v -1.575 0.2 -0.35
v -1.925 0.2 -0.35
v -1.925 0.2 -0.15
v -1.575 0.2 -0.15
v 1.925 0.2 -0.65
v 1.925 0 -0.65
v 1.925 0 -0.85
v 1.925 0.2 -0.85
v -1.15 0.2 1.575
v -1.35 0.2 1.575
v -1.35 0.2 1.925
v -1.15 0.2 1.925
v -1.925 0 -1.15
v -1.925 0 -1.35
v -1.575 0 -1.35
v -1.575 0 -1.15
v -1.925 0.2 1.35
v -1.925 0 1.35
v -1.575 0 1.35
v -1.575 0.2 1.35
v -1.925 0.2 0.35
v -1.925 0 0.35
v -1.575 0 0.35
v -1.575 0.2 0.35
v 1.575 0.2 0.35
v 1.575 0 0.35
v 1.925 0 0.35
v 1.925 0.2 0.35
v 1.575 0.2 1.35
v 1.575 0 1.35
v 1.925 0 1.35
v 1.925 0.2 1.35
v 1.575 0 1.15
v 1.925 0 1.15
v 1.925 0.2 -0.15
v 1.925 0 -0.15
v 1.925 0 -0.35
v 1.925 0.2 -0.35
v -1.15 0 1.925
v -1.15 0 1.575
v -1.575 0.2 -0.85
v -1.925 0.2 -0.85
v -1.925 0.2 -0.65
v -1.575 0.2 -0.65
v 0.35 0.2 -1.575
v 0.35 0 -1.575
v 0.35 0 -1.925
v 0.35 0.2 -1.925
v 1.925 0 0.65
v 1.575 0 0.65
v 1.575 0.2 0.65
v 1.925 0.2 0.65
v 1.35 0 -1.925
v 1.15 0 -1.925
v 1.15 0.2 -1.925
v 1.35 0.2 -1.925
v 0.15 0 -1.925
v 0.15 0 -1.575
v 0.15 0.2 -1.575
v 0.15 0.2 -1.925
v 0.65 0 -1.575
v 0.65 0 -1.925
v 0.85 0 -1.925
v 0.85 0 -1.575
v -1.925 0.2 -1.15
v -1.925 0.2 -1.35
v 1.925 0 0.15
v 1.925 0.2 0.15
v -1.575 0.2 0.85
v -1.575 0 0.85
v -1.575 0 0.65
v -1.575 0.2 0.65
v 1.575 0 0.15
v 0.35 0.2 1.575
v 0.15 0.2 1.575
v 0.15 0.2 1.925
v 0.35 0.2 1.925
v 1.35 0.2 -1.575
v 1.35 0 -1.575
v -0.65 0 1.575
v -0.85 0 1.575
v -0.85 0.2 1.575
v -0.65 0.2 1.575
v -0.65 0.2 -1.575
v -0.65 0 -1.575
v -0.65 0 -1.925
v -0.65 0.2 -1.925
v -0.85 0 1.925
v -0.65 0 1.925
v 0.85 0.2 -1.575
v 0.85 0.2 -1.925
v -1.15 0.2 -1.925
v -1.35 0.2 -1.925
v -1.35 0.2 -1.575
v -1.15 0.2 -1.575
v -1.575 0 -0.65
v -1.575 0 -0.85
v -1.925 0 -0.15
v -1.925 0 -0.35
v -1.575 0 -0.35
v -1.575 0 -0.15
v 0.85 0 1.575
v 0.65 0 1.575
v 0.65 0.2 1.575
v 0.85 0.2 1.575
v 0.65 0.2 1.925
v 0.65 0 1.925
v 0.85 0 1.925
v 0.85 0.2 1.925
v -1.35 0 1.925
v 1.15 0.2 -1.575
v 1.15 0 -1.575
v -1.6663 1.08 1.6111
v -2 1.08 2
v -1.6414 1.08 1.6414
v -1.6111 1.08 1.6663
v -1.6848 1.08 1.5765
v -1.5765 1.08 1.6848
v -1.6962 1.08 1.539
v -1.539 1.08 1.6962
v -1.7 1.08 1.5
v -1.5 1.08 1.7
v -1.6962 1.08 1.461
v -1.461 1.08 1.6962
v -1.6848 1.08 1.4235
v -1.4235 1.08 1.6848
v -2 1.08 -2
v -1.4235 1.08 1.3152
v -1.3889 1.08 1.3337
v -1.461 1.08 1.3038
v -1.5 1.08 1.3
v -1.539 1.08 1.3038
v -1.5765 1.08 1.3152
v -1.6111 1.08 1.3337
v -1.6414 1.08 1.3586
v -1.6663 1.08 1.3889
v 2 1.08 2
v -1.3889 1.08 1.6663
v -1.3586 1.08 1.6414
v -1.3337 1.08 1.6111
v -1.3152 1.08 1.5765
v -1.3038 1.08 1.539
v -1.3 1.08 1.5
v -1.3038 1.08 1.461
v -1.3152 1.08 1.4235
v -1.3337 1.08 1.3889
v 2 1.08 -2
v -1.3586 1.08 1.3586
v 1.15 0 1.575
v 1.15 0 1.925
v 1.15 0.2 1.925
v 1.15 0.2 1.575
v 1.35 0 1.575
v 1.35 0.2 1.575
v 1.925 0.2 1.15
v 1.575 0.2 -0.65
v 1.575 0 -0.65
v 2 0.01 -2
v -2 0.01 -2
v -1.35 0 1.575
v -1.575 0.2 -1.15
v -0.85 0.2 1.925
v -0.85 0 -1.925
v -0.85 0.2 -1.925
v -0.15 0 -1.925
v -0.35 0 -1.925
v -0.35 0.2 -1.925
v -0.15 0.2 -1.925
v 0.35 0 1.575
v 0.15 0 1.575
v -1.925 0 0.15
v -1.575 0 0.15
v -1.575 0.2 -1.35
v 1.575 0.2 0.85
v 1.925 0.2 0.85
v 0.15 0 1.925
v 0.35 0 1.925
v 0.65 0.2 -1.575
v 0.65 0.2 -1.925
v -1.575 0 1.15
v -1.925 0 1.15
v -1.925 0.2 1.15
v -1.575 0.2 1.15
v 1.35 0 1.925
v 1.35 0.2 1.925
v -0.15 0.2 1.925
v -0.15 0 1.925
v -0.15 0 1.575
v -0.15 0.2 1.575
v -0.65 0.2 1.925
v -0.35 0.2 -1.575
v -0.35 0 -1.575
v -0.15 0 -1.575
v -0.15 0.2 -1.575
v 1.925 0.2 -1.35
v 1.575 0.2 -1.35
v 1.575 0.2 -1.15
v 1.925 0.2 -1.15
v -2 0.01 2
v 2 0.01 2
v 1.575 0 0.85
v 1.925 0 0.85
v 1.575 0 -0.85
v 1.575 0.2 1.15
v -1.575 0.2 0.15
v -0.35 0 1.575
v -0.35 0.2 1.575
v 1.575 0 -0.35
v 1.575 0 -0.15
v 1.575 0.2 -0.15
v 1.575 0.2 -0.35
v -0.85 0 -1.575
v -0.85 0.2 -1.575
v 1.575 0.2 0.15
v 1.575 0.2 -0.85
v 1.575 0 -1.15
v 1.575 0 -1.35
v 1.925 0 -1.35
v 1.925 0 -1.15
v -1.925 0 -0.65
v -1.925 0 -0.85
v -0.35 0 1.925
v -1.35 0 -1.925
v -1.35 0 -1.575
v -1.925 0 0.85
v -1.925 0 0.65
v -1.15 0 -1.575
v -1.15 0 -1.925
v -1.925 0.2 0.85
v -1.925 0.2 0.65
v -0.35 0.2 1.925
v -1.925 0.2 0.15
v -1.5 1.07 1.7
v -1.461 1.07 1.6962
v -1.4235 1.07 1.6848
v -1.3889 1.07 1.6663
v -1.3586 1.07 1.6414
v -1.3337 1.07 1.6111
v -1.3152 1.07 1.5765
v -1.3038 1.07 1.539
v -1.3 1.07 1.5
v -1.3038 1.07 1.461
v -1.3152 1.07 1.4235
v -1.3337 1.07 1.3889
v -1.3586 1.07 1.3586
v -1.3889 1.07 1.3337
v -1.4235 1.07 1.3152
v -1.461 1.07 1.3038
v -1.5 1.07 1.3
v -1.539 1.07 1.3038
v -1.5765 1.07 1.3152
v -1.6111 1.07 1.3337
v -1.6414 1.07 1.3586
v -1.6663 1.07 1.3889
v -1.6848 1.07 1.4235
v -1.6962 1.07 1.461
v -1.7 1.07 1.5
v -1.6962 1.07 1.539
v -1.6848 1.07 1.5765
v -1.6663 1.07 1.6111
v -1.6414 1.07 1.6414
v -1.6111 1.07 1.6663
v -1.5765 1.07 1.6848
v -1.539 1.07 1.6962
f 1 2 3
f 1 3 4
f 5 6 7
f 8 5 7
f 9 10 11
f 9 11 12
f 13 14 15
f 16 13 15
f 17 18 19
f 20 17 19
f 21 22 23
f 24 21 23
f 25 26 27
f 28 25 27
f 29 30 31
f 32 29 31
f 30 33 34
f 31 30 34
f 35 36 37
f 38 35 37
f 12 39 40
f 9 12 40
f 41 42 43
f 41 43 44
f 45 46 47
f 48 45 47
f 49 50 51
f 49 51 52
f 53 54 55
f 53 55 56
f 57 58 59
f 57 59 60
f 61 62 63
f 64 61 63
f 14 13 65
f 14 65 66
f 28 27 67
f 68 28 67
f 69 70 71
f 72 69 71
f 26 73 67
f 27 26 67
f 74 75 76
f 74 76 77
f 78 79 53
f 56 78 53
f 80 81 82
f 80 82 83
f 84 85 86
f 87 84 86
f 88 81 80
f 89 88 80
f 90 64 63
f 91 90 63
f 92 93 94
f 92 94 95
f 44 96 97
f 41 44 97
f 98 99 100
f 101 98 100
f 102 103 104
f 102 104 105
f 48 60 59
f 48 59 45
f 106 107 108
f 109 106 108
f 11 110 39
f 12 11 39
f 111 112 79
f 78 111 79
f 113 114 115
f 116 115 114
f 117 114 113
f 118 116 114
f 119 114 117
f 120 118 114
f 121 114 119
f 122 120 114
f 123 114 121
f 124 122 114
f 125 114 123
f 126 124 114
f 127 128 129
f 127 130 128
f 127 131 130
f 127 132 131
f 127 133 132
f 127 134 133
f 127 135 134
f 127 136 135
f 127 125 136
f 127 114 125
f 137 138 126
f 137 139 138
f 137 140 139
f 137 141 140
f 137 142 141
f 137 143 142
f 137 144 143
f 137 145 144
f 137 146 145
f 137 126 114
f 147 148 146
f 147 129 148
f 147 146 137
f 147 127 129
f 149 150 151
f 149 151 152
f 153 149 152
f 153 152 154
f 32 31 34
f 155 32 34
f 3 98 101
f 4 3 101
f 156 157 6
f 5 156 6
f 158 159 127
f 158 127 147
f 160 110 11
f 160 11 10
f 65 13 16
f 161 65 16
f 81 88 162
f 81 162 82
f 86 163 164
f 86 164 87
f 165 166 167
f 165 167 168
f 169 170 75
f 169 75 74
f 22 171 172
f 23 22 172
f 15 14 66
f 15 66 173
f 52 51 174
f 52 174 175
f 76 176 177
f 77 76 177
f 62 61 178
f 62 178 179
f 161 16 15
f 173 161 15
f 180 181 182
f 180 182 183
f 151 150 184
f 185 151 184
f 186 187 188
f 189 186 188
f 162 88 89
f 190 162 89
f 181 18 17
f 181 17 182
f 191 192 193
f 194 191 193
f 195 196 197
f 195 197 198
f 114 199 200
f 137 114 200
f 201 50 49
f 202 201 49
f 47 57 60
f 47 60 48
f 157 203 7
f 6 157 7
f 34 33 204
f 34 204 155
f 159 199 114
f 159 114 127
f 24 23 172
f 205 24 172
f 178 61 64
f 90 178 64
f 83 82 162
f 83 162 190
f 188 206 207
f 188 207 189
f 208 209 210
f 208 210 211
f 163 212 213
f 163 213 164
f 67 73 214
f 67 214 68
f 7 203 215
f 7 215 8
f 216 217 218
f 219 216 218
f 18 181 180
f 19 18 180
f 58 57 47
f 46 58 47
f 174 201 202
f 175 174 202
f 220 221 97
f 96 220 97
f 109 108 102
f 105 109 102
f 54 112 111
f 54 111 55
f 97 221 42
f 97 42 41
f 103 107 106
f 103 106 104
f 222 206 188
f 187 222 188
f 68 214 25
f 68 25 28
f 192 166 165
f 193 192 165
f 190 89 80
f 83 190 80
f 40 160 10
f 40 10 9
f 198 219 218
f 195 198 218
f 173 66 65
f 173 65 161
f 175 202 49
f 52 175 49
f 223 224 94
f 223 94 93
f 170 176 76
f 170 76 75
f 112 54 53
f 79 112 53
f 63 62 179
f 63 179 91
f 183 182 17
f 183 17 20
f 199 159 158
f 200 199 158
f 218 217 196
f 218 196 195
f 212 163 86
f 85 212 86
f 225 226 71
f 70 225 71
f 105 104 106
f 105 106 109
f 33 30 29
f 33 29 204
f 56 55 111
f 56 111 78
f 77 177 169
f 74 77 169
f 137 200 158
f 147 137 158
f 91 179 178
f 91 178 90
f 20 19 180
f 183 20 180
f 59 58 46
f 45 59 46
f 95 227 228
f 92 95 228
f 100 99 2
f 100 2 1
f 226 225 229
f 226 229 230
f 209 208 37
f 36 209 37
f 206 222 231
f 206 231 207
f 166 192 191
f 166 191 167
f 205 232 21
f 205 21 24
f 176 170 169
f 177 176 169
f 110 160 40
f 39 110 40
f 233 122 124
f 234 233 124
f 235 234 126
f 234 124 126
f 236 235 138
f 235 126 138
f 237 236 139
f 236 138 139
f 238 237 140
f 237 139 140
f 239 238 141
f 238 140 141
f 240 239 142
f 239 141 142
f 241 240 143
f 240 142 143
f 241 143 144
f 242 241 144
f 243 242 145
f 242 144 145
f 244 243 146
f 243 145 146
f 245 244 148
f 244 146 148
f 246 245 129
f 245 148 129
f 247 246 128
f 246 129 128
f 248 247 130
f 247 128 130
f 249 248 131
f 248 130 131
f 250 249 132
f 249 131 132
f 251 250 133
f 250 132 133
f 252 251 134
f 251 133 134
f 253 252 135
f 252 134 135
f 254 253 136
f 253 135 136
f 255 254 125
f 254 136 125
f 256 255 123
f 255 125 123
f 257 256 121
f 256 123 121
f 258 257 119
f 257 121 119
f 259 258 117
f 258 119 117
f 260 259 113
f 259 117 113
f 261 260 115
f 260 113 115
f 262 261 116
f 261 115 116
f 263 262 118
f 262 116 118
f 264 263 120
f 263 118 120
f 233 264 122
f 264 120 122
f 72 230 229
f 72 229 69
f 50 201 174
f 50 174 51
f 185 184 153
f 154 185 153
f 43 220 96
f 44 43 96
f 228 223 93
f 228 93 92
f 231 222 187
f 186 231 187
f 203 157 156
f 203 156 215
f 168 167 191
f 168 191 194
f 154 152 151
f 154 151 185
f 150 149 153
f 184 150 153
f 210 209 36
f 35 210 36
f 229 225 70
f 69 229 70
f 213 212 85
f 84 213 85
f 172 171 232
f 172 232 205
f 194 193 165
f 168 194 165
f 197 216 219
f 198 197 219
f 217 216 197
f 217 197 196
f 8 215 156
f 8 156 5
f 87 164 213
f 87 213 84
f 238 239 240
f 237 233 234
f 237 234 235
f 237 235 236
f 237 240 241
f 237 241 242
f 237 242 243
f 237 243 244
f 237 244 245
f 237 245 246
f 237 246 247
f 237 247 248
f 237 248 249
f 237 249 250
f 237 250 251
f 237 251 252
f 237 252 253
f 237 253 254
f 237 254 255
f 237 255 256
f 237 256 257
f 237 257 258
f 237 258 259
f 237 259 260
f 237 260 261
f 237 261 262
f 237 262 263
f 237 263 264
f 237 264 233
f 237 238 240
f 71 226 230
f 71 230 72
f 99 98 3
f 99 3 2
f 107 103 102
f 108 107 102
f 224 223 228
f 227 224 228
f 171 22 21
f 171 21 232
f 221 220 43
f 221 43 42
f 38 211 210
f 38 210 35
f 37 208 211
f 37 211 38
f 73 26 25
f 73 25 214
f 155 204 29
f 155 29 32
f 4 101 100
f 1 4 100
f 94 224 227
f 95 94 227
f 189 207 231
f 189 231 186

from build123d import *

# Parameters (mm, degrees)
SKETCH1_W              = 0.35
SKETCH1_H              = 0.2
BOSS_EXTRUDE1_DEPTH    = 0.2
BOSS_EXTRUDE1_2_DEPTH  = 0.2
BOSS_EXTRUDE1_3_DEPTH  = 0.2
SKETCH1_W_2            = 0.2
SKETCH1_H_2            = 0.35
BOSS_EXTRUDE1_4_DEPTH  = 0.2
BOSS_EXTRUDE1_5_DEPTH  = 0.2
BOSS_EXTRUDE1_6_DEPTH  = 0.2
BOSS_EXTRUDE1_7_DEPTH  = 0.2
BOSS_EXTRUDE1_8_DEPTH  = 0.2
BOSS_EXTRUDE1_9_DEPTH  = 0.2
BOSS_EXTRUDE1_10_DEPTH = 0.2
BOSS_EXTRUDE1_11_DEPTH = 0.2
BOSS_EXTRUDE1_12_DEPTH = 0.2
BOSS_EXTRUDE1_13_DEPTH = 0.2
BOSS_EXTRUDE1_14_DEPTH = 0.2
BOSS_EXTRUDE1_15_DEPTH = 0.2
BOSS_EXTRUDE1_16_DEPTH = 0.2
BOSS_EXTRUDE1_17_DEPTH = 0.2
BOSS_EXTRUDE1_18_DEPTH = 0.2
BOSS_EXTRUDE1_19_DEPTH = 0.2
BOSS_EXTRUDE1_20_DEPTH = 0.2
BOSS_EXTRUDE1_21_DEPTH = 0.2
BOSS_EXTRUDE1_22_DEPTH = 0.2
BOSS_EXTRUDE1_23_DEPTH = 0.2
BOSS_EXTRUDE1_24_DEPTH = 0.2
BOSS_EXTRUDE2_START    = 0.01
SKETCH2_W              = 4
SKETCH2_H              = 4
BOSS_EXTRUDE2_DEPTH    = 1.07
SKETCH3_R              = 0.2
CUT_EXTRUDE2_DEPTH     = 0.01


with BuildPart() as part:
    # Sketch1 → Boss-Extrude1 (new body)
    with BuildSketch(Plane(origin=(0, 0, 0), x_dir=(1, 0, 0), z_dir=(0, 1, 0))):
        with Locations((-1.75, 0.75)):
            Rectangle(SKETCH1_W, SKETCH1_H)
    extrude(amount=BOSS_EXTRUDE1_DEPTH)


with BuildPart() as body_2:
    # Sketch1 → Boss-Extrude1 2 (new body)
    with BuildSketch(Plane(origin=(0, 0, 0), x_dir=(1, 0, 0), z_dir=(0, 1, 0))):
        with Locations((-1.75, 1.25)):
            Rectangle(SKETCH1_W, SKETCH1_H)
    extrude(amount=BOSS_EXTRUDE1_2_DEPTH)


with BuildPart() as body_3:
    # Sketch1 → Boss-Extrude1 3 (new body)
    with BuildSketch(Plane(origin=(0, 0, 0), x_dir=(1, 0, 0), z_dir=(0, 1, 0))):
        with Locations((-1.75, 0.25)):
            Rectangle(SKETCH1_W, SKETCH1_H)
    extrude(amount=BOSS_EXTRUDE1_3_DEPTH)


with BuildPart() as body_4:
    # Sketch1 → Boss-Extrude1 4 (new body)
    with BuildSketch(Plane(origin=(0, 0, 0), x_dir=(1, 0, 0), z_dir=(0, 1, 0))):
        with Locations((-0.75, 1.75)):
            Rectangle(SKETCH1_W_2, SKETCH1_H_2)
    extrude(amount=BOSS_EXTRUDE1_4_DEPTH)


with BuildPart() as body_5:
    # Sketch1 → Boss-Extrude1 5 (new body)
    with BuildSketch(Plane(origin=(0, 0, 0), x_dir=(1, 0, 0), z_dir=(0, 1, 0))):
        with Locations((-1.25, 1.75)):
            Rectangle(SKETCH1_W_2, SKETCH1_H_2)
    extrude(amount=BOSS_EXTRUDE1_5_DEPTH)


with BuildPart() as body_6:
    # Sketch1 → Boss-Extrude1 6 (new body)
    with BuildSketch(Plane(origin=(0, 0, 0), x_dir=(1, 0, 0), z_dir=(0, 1, 0))):
        with Locations((-0.25, 1.75)):
            Rectangle(SKETCH1_W_2, SKETCH1_H_2)
    extrude(amount=BOSS_EXTRUDE1_6_DEPTH)


with BuildPart() as body_7:
    # Sketch1 → Boss-Extrude1 7 (new body)
    with BuildSketch(Plane(origin=(0, 0, 0), x_dir=(1, 0, 0), z_dir=(0, 1, 0))):
        with Locations((0.25, 1.75)):
            Rectangle(SKETCH1_W_2, SKETCH1_H_2)
    extrude(amount=BOSS_EXTRUDE1_7_DEPTH)


with BuildPart() as body_8:
    # Sketch1 → Boss-Extrude1 8 (new body)
    with BuildSketch(Plane(origin=(0, 0, 0), x_dir=(1, 0, 0), z_dir=(0, 1, 0))):
        with Locations((0.75, 1.75)):
            Rectangle(SKETCH1_W_2, SKETCH1_H_2)
    extrude(amount=BOSS_EXTRUDE1_8_DEPTH)


with BuildPart() as body_9:
    # Sketch1 → Boss-Extrude1 9 (new body)
    with BuildSketch(Plane(origin=(0, 0, 0), x_dir=(1, 0, 0), z_dir=(0, 1, 0))):
        with Locations((1.25, 1.75)):
            Rectangle(SKETCH1_W_2, SKETCH1_H_2)
    extrude(amount=BOSS_EXTRUDE1_9_DEPTH)


with BuildPart() as body_10:
    # Sketch1 → Boss-Extrude1 10 (new body)
    with BuildSketch(Plane(origin=(0, 0, 0), x_dir=(1, 0, 0), z_dir=(0, 1, 0))):
        with Locations((1.75, 0.25)):
            Rectangle(SKETCH1_W, SKETCH1_H)
    extrude(amount=BOSS_EXTRUDE1_10_DEPTH)


with BuildPart() as body_11:
    # Sketch1 → Boss-Extrude1 11 (new body)
    with BuildSketch(Plane(origin=(0, 0, 0), x_dir=(1, 0, 0), z_dir=(0, 1, 0))):
        with Locations((1.75, 0.75)):
            Rectangle(SKETCH1_W, SKETCH1_H)
    extrude(amount=BOSS_EXTRUDE1_11_DEPTH)


with BuildPart() as body_12:
    # Sketch1 → Boss-Extrude1 12 (new body)
    with BuildSketch(Plane(origin=(0, 0, 0), x_dir=(1, 0, 0), z_dir=(0, 1, 0))):
        with Locations((1.75, 1.25)):
            Rectangle(SKETCH1_W, SKETCH1_H)
    extrude(amount=BOSS_EXTRUDE1_12_DEPTH)


with BuildPart() as body_13:
    # Sketch1 → Boss-Extrude1 13 (new body)
    with BuildSketch(Plane(origin=(0, 0, 0), x_dir=(1, 0, 0), z_dir=(0, 1, 0))):
        with Locations((1.75, -0.75)):
            Rectangle(SKETCH1_W, SKETCH1_H)
    extrude(amount=BOSS_EXTRUDE1_13_DEPTH)


with BuildPart() as body_14:
    # Sketch1 → Boss-Extrude1 14 (new body)
    with BuildSketch(Plane(origin=(0, 0, 0), x_dir=(1, 0, 0), z_dir=(0, 1, 0))):
        with Locations((1.75, -1.25)):
            Rectangle(SKETCH1_W, SKETCH1_H)
    extrude(amount=BOSS_EXTRUDE1_14_DEPTH)


with BuildPart() as body_15:
    # Sketch1 → Boss-Extrude1 15 (new body)
    with BuildSketch(Plane(origin=(0, 0, 0), x_dir=(1, 0, 0), z_dir=(0, 1, 0))):
        with Locations((1.75, -0.25)):
            Rectangle(SKETCH1_W, SKETCH1_H)
    extrude(amount=BOSS_EXTRUDE1_15_DEPTH)


with BuildPart() as body_16:
    # Sketch1 → Boss-Extrude1 16 (new body)
    with BuildSketch(Plane(origin=(0, 0, 0), x_dir=(1, 0, 0), z_dir=(0, 1, 0))):
        with Locations((0.75, -1.75)):
            Rectangle(SKETCH1_W_2, SKETCH1_H_2)
    extrude(amount=BOSS_EXTRUDE1_16_DEPTH)


with BuildPart() as body_17:
    # Sketch1 → Boss-Extrude1 17 (new body)
    with BuildSketch(Plane(origin=(0, 0, 0), x_dir=(1, 0, 0), z_dir=(0, 1, 0))):
        with Locations((1.25, -1.75)):
            Rectangle(SKETCH1_W_2, SKETCH1_H_2)
    extrude(amount=BOSS_EXTRUDE1_17_DEPTH)


with BuildPart() as body_18:
    # Sketch1 → Boss-Extrude1 18 (new body)
    with BuildSketch(Plane(origin=(0, 0, 0), x_dir=(1, 0, 0), z_dir=(0, 1, 0))):
        with Locations((0.25, -1.75)):
            Rectangle(SKETCH1_W_2, SKETCH1_H_2)
    extrude(amount=BOSS_EXTRUDE1_18_DEPTH)


with BuildPart() as body_19:
    # Sketch1 → Boss-Extrude1 19 (new body)
    with BuildSketch(Plane(origin=(0, 0, 0), x_dir=(1, 0, 0), z_dir=(0, 1, 0))):
        with Locations((-0.25, -1.75)):
            Rectangle(SKETCH1_W_2, SKETCH1_H_2)
    extrude(amount=BOSS_EXTRUDE1_19_DEPTH)


with BuildPart() as body_20:
    # Sketch1 → Boss-Extrude1 20 (new body)
    with BuildSketch(Plane(origin=(0, 0, 0), x_dir=(1, 0, 0), z_dir=(0, 1, 0))):
        with Locations((-0.75, -1.75)):
            Rectangle(SKETCH1_W_2, SKETCH1_H_2)
    extrude(amount=BOSS_EXTRUDE1_20_DEPTH)


with BuildPart() as body_21:
    # Sketch1 → Boss-Extrude1 21 (new body)
    with BuildSketch(Plane(origin=(0, 0, 0), x_dir=(1, 0, 0), z_dir=(0, 1, 0))):
        with Locations((-1.25, -1.75)):
            Rectangle(SKETCH1_W_2, SKETCH1_H_2)
    extrude(amount=BOSS_EXTRUDE1_21_DEPTH)


with BuildPart() as body_22:
    # Sketch1 → Boss-Extrude1 22 (new body)
    with BuildSketch(Plane(origin=(0, 0, 0), x_dir=(1, 0, 0), z_dir=(0, 1, 0))):
        with Locations((-1.75, -0.25)):
            Rectangle(SKETCH1_W, SKETCH1_H)
    extrude(amount=BOSS_EXTRUDE1_22_DEPTH)


with BuildPart() as body_23:
    # Sketch1 → Boss-Extrude1 23 (new body)
    with BuildSketch(Plane(origin=(0, 0, 0), x_dir=(1, 0, 0), z_dir=(0, 1, 0))):
        with Locations((-1.75, -0.75)):
            Rectangle(SKETCH1_W, SKETCH1_H)
    extrude(amount=BOSS_EXTRUDE1_23_DEPTH)


with BuildPart() as body_24:
    # Sketch1 → Boss-Extrude1 24 (new body)
    with BuildSketch(Plane(origin=(0, 0, 0), x_dir=(1, 0, 0), z_dir=(0, 1, 0))):
        with Locations((-1.75, -1.25)):
            Rectangle(SKETCH1_W, SKETCH1_H)
    extrude(amount=BOSS_EXTRUDE1_24_DEPTH)


with BuildPart() as body_25:
    # Sketch2 → Boss-Extrude2 (new body)
    with BuildSketch(Plane(origin=(0, 0, 0), x_dir=(1, 0, 0), z_dir=(0, 1, 0)).offset(BOSS_EXTRUDE2_START)):
        Rectangle(SKETCH2_W, SKETCH2_H)
    extrude(amount=BOSS_EXTRUDE2_DEPTH)

    # Sketch3 → Cut-Extrude2 (cut)
    with BuildSketch(Plane(origin=(0, 1.08, 0), x_dir=(1, 0, 0), z_dir=(0, 1, 0))):
        with Locations(Location((-1.5, -1.5, 0), (0, 0, 270))):
            Circle(SKETCH3_R)
    extrude(amount=-CUT_EXTRUDE2_DEPTH, mode=Mode.SUBTRACT)


solid = Compound([part.part, body_2.part, body_3.part, body_4.part, body_5.part, body_6.part, body_7.part, body_8.part, body_9.part, body_10.part, body_11.part, body_12.part, body_13.part, body_14.part, body_15.part, body_16.part, body_17.part, body_18.part, body_19.part, body_20.part, body_21.part, body_22.part, body_23.part, body_24.part, body_25.part])
